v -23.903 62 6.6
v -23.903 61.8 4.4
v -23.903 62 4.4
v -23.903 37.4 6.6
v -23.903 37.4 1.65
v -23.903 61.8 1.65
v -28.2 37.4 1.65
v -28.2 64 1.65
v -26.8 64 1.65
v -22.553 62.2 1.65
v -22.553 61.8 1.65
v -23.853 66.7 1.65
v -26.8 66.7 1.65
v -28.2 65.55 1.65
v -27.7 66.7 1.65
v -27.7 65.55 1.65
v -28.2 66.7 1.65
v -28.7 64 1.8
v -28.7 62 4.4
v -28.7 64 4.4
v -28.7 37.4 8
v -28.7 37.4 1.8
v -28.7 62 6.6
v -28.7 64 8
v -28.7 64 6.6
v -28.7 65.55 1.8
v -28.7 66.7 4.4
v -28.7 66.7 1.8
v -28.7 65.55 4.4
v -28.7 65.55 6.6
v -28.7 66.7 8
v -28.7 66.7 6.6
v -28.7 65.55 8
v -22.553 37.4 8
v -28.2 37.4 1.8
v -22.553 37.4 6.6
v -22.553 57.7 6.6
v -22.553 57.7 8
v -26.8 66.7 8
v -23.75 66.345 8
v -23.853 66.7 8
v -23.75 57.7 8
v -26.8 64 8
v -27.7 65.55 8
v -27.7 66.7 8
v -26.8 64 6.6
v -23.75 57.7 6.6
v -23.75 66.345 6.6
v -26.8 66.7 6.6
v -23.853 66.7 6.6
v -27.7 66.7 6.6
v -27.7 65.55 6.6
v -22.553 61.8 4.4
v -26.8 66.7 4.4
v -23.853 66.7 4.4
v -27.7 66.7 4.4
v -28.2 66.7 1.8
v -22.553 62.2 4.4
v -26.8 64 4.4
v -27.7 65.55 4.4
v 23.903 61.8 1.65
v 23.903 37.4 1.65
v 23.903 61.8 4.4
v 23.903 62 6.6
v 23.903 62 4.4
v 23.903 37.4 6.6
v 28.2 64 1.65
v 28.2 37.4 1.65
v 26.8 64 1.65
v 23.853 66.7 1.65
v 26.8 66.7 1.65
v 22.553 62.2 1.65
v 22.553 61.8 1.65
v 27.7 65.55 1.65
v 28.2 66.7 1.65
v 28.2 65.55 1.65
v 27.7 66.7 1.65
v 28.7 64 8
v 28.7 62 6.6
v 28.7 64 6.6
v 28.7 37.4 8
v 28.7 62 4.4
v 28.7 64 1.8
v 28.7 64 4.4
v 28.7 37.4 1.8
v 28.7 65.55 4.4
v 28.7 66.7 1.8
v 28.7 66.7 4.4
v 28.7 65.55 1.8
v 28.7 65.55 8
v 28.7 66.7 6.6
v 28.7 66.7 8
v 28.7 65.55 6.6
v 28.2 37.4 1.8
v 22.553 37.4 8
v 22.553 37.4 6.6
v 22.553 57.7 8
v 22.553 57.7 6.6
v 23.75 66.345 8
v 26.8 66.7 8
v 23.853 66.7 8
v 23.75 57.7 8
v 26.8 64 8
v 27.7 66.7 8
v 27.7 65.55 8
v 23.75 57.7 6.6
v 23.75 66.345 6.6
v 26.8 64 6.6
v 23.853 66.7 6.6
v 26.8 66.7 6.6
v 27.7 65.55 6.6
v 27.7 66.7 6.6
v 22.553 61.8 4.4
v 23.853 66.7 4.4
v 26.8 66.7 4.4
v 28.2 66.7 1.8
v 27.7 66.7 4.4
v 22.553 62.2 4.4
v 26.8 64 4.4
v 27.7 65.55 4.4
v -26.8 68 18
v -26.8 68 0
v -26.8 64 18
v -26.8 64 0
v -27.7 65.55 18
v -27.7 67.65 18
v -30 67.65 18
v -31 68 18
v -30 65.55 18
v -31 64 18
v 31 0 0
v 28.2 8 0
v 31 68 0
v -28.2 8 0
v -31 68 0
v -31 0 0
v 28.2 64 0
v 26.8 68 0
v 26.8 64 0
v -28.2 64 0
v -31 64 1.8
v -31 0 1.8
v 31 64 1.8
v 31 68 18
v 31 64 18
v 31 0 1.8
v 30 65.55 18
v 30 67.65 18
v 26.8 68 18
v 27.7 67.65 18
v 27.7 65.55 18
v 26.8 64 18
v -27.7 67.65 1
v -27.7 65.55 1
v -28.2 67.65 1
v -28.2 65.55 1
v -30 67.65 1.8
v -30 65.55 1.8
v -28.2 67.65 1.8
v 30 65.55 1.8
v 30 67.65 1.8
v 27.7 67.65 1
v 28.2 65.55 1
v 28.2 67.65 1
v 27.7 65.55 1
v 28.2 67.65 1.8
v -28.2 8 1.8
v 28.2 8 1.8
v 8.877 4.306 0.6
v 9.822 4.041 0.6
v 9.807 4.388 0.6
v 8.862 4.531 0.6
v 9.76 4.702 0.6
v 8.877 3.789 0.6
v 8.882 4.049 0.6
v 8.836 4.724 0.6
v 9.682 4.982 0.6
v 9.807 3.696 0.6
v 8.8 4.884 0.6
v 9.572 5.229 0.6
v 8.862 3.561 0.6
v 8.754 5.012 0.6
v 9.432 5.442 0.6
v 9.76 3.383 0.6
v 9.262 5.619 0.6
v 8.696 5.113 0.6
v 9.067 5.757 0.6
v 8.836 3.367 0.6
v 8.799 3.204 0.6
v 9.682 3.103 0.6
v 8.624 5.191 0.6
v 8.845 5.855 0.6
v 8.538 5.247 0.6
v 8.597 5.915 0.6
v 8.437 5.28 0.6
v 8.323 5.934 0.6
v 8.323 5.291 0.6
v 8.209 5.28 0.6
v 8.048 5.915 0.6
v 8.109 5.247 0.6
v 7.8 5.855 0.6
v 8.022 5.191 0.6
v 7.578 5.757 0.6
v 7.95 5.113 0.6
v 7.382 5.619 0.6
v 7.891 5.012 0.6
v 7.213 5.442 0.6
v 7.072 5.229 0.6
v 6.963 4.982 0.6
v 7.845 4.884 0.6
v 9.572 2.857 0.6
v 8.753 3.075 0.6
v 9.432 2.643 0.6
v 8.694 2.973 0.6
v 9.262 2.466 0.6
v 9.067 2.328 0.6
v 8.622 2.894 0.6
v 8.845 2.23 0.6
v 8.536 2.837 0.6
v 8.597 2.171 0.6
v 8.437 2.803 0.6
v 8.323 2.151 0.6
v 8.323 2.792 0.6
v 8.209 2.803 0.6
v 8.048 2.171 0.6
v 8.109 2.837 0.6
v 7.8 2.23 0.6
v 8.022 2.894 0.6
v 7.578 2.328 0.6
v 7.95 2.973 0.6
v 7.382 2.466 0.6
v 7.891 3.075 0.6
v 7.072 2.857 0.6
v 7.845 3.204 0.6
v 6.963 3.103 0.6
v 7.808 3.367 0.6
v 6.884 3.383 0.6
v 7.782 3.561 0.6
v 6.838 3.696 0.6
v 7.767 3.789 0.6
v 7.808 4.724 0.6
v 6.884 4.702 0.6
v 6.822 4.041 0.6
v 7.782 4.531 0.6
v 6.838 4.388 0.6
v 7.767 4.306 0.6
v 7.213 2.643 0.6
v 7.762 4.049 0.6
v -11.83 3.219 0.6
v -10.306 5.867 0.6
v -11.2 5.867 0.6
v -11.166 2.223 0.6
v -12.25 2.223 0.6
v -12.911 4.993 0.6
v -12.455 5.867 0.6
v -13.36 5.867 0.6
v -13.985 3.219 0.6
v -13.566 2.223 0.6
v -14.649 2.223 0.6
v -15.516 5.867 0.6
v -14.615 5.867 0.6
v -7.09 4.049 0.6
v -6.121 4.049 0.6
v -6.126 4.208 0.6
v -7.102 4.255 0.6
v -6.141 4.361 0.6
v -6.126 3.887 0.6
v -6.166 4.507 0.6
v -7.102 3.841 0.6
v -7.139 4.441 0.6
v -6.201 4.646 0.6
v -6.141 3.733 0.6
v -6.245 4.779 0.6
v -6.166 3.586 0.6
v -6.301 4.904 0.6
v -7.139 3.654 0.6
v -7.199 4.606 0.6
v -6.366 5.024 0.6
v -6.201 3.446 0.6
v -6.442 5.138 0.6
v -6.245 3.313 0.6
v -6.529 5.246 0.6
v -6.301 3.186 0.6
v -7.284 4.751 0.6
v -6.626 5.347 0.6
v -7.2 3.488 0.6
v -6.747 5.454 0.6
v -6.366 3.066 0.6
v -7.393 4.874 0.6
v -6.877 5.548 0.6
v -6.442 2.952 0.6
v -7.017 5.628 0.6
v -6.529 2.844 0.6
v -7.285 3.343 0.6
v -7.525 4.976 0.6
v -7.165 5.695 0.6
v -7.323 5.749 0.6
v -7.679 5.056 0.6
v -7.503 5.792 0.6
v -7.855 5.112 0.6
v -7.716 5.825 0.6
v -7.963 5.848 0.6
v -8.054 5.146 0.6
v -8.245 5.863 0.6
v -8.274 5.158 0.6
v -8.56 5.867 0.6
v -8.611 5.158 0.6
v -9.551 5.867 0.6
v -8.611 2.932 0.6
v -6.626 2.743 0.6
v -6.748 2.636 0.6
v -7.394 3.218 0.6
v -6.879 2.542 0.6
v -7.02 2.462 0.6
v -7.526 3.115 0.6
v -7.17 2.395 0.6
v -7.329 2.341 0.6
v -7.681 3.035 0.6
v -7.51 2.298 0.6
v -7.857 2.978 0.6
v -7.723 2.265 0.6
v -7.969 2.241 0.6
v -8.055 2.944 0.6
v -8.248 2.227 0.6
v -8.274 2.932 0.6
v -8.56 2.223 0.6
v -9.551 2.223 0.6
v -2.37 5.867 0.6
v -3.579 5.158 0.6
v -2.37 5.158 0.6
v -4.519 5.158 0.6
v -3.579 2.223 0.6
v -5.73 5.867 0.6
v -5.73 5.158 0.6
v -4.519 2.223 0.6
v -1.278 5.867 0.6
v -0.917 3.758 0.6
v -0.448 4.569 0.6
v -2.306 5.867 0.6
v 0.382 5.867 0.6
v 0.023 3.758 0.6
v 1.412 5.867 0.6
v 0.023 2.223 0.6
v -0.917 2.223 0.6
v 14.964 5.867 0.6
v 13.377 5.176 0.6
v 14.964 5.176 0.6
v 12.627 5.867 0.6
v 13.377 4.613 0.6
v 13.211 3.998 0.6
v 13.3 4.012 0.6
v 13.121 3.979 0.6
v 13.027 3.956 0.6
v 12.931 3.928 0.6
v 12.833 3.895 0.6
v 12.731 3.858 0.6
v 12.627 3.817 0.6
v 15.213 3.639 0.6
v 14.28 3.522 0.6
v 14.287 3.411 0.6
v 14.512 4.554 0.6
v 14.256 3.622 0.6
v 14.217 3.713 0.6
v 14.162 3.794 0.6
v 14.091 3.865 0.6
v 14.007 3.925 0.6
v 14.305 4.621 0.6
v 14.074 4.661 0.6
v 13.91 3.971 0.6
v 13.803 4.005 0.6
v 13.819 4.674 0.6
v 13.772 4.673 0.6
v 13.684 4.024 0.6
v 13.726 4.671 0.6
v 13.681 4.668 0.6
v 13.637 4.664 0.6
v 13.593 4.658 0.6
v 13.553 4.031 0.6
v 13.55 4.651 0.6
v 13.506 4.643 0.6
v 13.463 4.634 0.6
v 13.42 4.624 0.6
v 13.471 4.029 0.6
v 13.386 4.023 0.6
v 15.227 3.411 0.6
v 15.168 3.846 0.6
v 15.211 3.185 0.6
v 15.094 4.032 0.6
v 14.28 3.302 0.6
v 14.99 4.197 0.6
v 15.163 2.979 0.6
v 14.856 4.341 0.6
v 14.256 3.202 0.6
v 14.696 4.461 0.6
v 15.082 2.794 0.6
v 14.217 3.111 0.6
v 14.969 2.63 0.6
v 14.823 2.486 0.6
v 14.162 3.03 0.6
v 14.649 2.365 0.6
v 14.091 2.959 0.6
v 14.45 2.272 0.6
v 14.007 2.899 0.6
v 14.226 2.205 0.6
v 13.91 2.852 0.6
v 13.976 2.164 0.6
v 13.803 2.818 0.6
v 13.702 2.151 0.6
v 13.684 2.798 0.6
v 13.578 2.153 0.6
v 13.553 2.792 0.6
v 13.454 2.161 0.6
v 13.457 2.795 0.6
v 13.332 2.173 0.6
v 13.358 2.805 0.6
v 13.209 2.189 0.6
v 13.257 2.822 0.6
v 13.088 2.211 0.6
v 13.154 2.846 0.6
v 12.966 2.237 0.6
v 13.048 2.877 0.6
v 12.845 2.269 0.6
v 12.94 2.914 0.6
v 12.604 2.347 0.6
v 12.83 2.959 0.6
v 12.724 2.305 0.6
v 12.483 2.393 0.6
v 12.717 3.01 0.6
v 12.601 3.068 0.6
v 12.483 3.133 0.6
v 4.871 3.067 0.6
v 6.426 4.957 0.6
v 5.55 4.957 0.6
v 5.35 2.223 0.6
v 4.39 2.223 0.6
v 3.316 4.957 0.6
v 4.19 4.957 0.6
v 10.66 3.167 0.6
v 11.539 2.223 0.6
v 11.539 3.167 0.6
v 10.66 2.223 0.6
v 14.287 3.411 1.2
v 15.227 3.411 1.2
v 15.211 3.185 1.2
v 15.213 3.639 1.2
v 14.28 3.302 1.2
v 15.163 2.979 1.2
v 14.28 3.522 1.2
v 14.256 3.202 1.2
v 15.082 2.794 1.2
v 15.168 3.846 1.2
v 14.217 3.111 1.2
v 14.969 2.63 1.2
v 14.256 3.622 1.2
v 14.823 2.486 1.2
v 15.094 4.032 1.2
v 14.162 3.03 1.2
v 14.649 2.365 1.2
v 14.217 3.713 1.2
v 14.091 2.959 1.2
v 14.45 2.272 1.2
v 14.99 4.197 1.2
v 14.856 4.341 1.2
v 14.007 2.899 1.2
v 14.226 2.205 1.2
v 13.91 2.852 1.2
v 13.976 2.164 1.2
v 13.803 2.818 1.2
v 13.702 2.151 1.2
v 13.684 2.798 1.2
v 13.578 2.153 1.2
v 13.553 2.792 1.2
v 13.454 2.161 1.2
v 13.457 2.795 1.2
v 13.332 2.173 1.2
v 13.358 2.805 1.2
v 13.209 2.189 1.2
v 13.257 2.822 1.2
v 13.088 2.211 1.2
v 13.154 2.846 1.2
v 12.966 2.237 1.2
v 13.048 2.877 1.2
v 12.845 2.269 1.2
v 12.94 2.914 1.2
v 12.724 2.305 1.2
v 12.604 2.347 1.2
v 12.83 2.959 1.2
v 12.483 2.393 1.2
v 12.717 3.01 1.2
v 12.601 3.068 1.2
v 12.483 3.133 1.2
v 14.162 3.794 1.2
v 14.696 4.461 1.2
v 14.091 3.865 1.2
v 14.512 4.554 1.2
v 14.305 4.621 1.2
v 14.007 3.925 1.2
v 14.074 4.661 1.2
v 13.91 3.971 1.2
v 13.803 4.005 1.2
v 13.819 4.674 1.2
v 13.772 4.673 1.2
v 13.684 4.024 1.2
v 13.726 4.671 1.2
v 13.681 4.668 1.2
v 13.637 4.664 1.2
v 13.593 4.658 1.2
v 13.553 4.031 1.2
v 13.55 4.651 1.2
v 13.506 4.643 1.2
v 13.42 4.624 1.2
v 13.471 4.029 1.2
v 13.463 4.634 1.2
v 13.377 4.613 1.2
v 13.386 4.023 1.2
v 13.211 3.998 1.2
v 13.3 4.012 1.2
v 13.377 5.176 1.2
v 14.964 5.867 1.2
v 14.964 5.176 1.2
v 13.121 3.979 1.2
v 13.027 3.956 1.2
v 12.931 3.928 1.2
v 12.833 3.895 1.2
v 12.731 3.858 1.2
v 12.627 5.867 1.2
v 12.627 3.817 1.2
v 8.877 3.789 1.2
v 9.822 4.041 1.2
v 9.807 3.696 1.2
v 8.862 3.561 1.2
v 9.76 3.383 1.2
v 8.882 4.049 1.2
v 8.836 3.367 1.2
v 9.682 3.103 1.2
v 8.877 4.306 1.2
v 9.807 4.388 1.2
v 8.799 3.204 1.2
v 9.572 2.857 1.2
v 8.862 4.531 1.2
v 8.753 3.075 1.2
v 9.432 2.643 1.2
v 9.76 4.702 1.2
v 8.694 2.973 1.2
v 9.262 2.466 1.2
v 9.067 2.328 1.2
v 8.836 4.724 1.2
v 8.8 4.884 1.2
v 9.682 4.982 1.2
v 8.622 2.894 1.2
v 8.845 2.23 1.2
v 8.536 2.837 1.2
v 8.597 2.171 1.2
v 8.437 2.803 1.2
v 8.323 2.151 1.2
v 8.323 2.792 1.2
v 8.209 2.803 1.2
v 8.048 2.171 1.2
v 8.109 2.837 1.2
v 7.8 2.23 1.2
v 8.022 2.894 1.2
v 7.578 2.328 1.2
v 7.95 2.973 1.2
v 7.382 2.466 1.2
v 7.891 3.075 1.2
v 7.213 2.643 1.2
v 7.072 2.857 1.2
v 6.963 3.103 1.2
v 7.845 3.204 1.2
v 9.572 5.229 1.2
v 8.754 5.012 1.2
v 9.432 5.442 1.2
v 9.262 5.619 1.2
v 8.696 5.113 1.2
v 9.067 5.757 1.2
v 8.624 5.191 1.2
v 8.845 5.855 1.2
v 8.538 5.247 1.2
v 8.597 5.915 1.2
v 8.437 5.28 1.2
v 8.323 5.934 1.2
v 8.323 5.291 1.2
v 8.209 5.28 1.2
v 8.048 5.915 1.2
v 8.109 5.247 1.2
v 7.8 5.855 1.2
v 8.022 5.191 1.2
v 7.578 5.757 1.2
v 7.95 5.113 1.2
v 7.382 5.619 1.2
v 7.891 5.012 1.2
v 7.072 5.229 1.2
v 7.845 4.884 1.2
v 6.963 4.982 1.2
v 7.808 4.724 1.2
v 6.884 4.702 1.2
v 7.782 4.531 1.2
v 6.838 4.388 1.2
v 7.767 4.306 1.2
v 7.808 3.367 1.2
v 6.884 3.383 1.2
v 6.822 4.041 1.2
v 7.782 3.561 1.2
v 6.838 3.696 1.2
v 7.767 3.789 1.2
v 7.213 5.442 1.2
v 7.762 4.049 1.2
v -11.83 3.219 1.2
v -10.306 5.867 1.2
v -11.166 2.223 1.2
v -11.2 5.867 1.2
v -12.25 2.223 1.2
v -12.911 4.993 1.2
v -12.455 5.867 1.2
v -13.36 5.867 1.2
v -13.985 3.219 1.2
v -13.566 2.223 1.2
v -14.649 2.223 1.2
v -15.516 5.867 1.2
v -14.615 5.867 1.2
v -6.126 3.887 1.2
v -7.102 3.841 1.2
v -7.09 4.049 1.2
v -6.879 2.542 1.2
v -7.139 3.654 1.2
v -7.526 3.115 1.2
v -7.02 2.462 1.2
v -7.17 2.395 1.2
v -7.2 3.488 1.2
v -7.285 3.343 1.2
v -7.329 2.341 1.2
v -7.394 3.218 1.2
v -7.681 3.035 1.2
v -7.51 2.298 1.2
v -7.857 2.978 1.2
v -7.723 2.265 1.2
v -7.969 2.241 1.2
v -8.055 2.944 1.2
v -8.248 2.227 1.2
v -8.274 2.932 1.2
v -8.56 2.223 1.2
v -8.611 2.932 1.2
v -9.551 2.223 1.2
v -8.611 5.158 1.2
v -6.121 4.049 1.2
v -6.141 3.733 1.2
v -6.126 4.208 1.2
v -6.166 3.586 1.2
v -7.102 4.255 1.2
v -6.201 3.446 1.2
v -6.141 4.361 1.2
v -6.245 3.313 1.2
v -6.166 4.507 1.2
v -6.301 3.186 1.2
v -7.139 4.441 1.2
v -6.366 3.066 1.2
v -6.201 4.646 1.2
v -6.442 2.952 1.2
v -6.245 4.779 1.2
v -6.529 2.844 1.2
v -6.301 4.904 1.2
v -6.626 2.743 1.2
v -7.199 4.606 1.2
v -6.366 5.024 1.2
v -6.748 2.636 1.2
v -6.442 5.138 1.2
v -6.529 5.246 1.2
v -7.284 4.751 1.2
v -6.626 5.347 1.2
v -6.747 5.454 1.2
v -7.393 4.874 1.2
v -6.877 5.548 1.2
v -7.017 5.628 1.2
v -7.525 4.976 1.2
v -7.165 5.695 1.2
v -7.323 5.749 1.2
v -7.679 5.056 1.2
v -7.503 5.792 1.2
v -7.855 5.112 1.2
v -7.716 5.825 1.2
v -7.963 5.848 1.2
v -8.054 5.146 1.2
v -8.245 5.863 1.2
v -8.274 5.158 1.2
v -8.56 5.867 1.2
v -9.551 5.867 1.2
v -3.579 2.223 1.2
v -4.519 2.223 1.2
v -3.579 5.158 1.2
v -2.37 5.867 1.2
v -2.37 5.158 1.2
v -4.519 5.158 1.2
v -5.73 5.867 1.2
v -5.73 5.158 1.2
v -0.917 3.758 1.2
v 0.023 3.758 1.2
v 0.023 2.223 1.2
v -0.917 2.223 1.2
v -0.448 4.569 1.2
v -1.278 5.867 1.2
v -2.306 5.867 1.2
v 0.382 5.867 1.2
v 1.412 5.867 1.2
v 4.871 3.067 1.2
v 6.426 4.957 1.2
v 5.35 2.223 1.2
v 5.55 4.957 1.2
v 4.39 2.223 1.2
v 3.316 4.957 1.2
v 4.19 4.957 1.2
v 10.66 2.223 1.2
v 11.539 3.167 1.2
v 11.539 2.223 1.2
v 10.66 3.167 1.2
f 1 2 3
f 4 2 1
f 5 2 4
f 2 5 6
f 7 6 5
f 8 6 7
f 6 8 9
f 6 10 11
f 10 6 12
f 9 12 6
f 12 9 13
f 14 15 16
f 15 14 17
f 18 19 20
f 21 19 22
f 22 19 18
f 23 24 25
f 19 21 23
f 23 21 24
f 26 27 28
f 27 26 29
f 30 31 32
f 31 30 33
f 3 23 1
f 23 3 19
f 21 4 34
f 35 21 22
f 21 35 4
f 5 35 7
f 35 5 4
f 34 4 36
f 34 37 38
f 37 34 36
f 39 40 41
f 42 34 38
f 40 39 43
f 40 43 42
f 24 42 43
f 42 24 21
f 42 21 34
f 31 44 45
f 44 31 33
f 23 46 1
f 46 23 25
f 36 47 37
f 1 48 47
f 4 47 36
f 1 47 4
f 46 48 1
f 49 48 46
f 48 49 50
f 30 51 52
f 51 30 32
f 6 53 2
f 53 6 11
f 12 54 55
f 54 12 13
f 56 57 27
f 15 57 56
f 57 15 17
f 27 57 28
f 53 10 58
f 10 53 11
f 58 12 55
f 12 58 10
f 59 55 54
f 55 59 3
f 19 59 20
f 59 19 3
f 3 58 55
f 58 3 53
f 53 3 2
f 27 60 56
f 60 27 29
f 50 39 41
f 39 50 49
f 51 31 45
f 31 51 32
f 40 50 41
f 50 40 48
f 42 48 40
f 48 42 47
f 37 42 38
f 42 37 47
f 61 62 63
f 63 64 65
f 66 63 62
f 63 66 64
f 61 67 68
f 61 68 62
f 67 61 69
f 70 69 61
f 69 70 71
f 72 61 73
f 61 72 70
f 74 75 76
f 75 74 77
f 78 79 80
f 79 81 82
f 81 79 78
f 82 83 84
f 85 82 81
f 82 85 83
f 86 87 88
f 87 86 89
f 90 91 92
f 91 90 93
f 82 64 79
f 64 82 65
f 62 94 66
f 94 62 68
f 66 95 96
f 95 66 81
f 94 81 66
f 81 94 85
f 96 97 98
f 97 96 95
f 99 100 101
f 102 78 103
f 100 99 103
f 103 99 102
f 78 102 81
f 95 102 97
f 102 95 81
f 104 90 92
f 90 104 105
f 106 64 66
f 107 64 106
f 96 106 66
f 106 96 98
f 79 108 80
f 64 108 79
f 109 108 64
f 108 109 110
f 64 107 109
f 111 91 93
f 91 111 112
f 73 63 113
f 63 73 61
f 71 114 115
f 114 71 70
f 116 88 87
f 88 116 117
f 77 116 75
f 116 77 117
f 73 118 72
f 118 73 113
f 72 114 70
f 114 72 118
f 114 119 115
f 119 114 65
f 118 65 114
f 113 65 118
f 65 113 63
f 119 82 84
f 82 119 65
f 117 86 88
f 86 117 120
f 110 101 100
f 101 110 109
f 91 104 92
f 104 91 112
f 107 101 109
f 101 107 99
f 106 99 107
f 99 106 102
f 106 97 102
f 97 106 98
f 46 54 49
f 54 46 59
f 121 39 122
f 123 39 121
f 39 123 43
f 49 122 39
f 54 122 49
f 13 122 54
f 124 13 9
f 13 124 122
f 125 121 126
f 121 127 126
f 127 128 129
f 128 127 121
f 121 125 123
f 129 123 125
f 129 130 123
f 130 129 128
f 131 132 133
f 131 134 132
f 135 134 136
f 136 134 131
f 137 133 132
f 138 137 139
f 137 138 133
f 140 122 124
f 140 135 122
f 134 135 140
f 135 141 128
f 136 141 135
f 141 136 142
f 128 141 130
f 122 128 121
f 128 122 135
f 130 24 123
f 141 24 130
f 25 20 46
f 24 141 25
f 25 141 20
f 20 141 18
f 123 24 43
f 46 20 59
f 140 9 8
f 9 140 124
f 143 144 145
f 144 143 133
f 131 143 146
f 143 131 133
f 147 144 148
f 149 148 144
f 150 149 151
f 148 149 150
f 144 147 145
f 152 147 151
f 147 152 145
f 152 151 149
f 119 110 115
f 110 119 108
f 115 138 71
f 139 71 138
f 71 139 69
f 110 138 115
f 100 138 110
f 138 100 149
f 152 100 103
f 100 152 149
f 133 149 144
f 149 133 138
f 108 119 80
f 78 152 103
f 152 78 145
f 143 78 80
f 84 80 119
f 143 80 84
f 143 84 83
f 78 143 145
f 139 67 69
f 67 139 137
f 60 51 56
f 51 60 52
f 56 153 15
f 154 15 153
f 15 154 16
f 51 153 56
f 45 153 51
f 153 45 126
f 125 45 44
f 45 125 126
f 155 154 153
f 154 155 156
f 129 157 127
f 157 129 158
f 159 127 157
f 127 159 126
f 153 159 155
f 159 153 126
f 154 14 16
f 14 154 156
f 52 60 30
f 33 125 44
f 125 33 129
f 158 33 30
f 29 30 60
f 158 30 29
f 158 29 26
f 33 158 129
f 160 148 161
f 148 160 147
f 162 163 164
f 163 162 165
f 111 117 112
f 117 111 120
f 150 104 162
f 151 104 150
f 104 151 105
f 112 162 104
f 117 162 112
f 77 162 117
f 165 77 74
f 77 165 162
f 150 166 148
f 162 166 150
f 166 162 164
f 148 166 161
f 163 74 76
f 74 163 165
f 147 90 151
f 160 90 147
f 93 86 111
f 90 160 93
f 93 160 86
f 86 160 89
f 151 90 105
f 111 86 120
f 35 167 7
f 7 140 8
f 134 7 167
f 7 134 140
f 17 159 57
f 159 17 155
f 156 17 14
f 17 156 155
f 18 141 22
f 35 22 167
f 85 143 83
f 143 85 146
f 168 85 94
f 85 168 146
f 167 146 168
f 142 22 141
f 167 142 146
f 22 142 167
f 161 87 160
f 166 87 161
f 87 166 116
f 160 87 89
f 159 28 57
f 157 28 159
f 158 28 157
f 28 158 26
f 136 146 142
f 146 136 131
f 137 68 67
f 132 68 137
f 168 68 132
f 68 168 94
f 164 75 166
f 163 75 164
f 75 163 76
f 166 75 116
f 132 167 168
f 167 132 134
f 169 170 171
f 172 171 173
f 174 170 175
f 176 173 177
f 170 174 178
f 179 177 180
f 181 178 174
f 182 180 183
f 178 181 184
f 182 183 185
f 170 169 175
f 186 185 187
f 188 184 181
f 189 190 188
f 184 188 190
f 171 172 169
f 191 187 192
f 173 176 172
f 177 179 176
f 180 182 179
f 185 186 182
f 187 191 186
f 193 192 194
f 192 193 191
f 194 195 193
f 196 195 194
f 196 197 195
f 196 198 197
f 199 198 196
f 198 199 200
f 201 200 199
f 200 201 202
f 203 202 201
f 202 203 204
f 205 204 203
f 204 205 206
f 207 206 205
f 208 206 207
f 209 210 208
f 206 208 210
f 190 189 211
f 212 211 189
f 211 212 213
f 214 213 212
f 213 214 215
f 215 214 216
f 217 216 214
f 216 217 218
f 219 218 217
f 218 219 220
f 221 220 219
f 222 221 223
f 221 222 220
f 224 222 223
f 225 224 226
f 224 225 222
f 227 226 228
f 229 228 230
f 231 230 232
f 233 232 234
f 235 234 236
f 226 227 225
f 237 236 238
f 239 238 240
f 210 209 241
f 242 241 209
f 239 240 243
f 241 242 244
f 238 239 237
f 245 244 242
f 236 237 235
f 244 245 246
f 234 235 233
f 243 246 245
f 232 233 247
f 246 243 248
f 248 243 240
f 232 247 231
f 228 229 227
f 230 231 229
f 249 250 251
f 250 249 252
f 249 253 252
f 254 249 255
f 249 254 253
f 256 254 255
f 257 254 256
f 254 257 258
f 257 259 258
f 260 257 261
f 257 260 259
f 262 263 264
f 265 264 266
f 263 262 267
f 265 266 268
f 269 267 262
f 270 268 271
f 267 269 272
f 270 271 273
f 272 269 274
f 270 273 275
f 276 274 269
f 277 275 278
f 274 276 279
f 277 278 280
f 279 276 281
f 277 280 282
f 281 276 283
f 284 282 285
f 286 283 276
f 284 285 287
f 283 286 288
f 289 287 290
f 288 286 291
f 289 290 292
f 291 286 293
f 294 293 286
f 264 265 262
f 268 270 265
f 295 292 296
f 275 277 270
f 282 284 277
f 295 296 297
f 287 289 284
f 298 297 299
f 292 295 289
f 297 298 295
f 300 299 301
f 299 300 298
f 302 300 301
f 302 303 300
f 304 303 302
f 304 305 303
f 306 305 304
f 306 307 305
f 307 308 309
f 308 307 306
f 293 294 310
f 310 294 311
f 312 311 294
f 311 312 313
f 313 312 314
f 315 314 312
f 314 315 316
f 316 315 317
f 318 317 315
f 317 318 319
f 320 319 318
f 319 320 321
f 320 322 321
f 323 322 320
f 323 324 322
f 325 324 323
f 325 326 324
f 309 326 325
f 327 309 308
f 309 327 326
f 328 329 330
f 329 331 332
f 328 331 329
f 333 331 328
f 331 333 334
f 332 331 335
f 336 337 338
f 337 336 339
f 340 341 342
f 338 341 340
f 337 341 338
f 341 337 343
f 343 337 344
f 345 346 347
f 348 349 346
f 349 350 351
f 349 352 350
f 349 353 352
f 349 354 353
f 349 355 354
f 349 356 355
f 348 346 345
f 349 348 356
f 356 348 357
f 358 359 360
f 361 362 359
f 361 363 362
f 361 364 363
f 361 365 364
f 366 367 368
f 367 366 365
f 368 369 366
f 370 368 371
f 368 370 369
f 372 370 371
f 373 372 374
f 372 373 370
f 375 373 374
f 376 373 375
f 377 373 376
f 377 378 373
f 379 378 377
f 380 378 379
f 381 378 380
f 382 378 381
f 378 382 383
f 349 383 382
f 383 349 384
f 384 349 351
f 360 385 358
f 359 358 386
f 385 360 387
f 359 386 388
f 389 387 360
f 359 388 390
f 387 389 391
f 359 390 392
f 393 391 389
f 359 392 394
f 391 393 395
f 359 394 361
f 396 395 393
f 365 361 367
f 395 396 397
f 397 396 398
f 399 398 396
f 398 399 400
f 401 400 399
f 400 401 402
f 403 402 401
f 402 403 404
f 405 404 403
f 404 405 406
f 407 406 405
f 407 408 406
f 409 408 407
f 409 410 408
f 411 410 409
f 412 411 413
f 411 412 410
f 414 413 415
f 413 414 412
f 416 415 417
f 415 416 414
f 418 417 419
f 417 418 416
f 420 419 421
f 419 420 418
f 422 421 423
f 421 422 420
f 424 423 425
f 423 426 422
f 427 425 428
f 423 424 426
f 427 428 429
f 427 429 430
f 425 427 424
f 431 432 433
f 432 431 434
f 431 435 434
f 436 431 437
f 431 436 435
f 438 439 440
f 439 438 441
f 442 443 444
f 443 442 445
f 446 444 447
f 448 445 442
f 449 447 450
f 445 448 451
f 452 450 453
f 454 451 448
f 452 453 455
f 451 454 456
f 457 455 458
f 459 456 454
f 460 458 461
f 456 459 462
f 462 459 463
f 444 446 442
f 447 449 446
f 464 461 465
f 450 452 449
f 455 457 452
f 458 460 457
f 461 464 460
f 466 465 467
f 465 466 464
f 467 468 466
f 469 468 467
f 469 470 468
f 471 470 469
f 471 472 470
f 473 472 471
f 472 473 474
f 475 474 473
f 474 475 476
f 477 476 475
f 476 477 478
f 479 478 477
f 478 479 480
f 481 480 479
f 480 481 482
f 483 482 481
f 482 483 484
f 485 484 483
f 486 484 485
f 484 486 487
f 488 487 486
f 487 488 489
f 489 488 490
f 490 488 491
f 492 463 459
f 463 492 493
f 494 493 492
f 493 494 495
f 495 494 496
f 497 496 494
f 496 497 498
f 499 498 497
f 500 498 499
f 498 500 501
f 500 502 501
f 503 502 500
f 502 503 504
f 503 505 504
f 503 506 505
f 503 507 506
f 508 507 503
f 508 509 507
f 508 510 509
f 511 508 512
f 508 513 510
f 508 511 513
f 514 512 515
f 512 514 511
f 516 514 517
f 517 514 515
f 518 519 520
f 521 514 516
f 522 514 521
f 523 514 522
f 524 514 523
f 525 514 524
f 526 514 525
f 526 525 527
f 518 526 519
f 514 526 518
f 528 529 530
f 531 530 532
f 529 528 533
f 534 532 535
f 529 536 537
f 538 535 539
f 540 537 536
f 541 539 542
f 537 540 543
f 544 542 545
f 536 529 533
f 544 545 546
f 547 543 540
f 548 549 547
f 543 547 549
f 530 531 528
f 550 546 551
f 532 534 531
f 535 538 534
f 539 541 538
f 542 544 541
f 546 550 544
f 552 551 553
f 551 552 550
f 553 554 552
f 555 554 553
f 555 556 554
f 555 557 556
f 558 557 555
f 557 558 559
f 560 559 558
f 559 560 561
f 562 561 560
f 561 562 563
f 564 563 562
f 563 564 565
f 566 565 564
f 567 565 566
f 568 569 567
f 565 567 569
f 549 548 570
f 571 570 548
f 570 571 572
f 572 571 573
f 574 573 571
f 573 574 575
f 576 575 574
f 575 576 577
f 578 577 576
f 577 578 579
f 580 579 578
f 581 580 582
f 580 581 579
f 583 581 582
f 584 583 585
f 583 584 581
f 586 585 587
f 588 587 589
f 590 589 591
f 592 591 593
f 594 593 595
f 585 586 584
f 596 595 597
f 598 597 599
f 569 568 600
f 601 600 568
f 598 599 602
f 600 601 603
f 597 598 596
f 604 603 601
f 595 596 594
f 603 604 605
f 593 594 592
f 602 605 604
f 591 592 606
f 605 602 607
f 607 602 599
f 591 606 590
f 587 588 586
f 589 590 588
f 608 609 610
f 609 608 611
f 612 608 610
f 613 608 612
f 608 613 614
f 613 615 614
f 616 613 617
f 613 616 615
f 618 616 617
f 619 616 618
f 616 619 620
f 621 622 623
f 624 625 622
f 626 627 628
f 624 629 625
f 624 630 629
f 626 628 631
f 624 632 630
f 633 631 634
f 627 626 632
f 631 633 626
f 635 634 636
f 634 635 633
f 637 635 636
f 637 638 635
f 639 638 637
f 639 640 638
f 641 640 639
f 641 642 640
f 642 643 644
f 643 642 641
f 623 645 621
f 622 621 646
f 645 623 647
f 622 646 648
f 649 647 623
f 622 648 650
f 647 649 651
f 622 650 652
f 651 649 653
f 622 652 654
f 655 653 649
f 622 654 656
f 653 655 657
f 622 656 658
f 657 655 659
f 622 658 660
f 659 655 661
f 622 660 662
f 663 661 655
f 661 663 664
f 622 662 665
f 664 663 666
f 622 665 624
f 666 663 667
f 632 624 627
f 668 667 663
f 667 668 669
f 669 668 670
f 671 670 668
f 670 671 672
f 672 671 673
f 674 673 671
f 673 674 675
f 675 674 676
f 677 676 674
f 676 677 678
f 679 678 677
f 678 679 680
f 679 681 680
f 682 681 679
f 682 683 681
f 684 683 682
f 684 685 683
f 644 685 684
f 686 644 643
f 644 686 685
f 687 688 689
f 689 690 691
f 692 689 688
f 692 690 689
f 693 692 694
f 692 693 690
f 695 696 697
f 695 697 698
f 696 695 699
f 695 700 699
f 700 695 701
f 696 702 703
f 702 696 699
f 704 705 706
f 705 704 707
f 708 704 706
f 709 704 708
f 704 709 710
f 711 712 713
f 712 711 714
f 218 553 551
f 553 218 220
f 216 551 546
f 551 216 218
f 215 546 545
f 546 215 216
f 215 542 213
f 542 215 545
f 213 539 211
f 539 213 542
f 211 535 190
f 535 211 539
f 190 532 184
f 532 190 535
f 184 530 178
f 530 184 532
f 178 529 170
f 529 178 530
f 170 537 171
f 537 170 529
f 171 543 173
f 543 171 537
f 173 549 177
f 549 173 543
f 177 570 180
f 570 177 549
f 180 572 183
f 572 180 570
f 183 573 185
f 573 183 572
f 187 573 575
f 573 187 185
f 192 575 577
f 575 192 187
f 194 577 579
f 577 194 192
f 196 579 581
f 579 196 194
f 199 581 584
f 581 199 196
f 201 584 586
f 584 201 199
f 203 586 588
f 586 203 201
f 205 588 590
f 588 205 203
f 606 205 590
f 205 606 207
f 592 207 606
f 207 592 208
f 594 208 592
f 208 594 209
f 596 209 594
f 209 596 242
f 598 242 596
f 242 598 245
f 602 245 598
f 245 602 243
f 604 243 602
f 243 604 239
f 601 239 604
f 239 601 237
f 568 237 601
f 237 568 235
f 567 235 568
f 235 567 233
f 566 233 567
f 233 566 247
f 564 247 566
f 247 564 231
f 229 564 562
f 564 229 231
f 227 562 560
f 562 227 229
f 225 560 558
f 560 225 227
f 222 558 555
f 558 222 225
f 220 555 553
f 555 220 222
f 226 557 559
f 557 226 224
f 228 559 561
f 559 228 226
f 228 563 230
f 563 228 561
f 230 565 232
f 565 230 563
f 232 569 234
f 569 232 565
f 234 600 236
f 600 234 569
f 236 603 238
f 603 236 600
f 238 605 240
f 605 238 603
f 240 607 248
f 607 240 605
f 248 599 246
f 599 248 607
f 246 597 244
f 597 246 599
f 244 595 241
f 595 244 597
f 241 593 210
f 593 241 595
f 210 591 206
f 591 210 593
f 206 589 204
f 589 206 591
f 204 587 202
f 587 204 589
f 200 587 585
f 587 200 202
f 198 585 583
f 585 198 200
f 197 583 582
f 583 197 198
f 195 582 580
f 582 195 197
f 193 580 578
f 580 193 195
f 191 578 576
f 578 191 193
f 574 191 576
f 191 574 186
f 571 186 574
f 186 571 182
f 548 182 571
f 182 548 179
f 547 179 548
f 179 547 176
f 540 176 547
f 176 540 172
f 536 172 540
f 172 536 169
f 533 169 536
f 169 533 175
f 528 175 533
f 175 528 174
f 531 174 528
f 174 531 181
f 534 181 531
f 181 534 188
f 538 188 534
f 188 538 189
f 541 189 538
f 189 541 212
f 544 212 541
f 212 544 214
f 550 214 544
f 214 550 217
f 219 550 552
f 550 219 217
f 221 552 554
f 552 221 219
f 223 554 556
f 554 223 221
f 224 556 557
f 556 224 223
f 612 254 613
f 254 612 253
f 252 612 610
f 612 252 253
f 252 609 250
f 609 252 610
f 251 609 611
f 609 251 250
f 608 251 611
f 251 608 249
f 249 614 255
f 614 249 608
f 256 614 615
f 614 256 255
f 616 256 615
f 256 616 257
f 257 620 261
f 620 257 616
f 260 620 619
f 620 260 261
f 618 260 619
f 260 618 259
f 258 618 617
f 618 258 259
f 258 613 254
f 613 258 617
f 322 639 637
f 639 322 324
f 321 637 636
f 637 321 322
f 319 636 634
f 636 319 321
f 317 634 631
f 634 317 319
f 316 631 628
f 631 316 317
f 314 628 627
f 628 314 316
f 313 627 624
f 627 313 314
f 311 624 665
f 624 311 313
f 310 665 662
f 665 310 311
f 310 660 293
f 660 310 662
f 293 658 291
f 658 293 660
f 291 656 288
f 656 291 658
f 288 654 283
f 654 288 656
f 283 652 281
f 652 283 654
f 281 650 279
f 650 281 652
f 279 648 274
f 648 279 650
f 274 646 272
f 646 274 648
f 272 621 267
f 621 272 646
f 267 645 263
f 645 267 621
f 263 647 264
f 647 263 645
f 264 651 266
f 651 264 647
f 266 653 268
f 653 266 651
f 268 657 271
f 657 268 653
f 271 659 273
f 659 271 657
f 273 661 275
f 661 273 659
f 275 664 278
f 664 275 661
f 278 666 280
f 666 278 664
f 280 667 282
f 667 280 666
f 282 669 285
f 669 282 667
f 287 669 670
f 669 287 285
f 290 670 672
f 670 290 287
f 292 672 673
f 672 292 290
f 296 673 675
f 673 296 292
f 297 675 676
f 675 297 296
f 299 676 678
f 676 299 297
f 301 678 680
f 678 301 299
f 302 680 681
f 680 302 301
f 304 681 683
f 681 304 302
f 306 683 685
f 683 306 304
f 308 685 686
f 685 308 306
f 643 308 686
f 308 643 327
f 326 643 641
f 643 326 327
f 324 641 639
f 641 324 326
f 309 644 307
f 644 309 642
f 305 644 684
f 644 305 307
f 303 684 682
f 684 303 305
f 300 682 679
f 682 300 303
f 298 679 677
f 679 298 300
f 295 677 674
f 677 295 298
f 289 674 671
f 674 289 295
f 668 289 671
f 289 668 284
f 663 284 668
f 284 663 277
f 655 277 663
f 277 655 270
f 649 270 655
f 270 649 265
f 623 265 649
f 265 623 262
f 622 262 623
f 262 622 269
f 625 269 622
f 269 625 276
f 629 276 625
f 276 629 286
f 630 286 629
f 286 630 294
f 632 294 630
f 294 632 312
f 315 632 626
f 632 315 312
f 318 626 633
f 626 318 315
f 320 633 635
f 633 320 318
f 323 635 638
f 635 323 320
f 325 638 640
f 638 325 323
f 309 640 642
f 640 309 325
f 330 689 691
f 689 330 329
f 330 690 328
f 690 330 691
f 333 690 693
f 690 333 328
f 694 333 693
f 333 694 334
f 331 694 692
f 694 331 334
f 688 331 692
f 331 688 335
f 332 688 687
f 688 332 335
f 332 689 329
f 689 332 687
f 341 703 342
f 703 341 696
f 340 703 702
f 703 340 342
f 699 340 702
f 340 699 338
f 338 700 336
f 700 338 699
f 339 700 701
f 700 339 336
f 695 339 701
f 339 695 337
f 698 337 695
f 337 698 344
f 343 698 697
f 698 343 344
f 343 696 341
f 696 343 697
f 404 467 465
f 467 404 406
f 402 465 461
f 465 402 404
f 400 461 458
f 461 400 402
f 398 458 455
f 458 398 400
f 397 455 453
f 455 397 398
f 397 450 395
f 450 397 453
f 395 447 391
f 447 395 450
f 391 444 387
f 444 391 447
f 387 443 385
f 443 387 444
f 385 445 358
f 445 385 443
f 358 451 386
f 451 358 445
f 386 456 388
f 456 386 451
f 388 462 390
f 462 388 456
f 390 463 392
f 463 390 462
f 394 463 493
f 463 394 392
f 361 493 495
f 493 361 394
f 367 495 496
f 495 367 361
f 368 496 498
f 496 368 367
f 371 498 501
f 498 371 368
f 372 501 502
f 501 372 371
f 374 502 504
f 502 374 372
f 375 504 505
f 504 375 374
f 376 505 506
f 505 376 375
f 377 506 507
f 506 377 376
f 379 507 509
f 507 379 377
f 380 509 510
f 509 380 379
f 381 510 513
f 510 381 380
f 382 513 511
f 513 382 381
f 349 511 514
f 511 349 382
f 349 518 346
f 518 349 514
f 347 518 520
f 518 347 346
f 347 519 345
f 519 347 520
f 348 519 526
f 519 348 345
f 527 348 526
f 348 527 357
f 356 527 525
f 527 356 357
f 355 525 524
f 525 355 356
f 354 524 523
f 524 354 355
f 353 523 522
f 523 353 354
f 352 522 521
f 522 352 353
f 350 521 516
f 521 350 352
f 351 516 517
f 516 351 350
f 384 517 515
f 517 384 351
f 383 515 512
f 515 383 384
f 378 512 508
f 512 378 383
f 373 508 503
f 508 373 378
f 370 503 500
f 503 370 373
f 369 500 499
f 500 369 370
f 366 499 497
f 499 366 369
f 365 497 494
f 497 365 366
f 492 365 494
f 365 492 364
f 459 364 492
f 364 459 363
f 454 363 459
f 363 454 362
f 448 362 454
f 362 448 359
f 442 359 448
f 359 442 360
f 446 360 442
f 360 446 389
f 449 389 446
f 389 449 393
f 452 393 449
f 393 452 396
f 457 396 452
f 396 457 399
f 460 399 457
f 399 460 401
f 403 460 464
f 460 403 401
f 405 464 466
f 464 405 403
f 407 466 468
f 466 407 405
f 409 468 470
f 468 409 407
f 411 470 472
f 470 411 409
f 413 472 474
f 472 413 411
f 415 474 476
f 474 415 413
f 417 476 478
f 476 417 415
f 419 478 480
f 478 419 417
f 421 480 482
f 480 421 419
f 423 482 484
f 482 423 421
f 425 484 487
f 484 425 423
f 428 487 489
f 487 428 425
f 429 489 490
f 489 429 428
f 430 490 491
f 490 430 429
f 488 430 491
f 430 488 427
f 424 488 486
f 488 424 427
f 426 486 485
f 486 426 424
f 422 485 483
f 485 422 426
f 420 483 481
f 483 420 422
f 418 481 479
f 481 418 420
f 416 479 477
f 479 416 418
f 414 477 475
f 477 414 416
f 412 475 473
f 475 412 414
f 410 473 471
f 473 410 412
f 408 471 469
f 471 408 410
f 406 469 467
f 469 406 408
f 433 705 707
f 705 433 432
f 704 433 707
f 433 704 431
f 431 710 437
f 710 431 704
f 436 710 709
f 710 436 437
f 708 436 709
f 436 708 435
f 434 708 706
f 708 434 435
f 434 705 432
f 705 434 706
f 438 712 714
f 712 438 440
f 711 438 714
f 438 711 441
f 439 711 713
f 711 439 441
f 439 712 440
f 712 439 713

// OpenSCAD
// v0.5 rear-bay fit test for the iodeo ESP Minitel V2 JST board.
// Units: mm. This fixture validates insertion and cable routing before the
// geometry is integrated into another full Minitel body print.

include <pcb_reference.scad>

part = "fixture"; // fixture, coupon, retainer, retainer_assembly, pcb, pcb_bare, components, cable, assembly, position_interference, route_interference
sweep_offset = 0;
$fn = 36;

// Measured hardware and Gerber-derived board dimensions.
pcb_length = 47.10521;
pcb_depth = 36.21792;
pcb_thickness = 1.60;
populated_height = 10.40;

// The USB-C side is the rear/trailing edge. Its metal shell is modelled as
// projecting 4 mm beyond the PCB for routing review, not as a fit datum.
pcb_rear_y = 60.0;
usb_outer_y = 64.0;
loop_front_y = 4.0;
route_depth = usb_outer_y - loop_front_y; // owner-selected 60 mm

pcb_z = 4.70;
slot_vertical_clearance = 0.30;
slot_side_clearance = 0.35;
// One millimetre is enough to carry the 1.6 mm PCB edge while keeping the
// nearby ESP32 module clear on the underside.
edge_capture = 1.00;

// Creality K2 baseline: 0.4 mm nozzle and 0.20 mm layers. Structural walls
// are multiples of practical line widths; the hidden mark spans three layers.
fixture_half_w = 31.0;
fixture_front_y = 0.0;
fixture_rear_y = 68.0;
base_h = 1.80;
rail_front_y = 37.40;
rail_rear_y = 62.00;
rail_mouth_y = 66.50;
rail_top_z = 8.00;
rail_outer_x = 28.70;

// Provisional until the cable is measured. The open fixture remains usable
// with a larger cable; this value controls only the visual routing reference.
cable_d = 5.0;
cable_z = rail_top_z + cable_d/2 + 0.20;

watermark_text = "WDTY v0.5";
watermark_z = 0.60;
watermark_h = 0.60;

board_edge_x = pcb_length/2;
slot_wall_x = board_edge_x + slot_side_clearance;
lip_inner_x = board_edge_x - edge_capture;
slot_bottom_z = pcb_z - slot_vertical_clearance;
slot_top_z = pcb_z + pcb_thickness + slot_vertical_clearance;

module placed_pcb(offset_y=0, thickness=pcb_thickness) {
    // Gerber (x,y) -> fixture (y,x): the USB/JST axis becomes front-to-rear.
    translate([-pcb_length/2, pcb_rear_y-18.11024+offset_y, pcb_z])
        mirror([1,0,0]) rotate([0,0,90])
            linear_extrude(height=thickness) pcb_reference_2d();
}

module left_rail(y0=rail_front_y, y1=rail_rear_y, mouth_y=rail_mouth_y) {
    // C-channel facing the PCB. Only the bare board edge enters the slot.
    difference() {
        union() {
            translate([-rail_outer_x,y0,base_h-0.15]) cube([rail_outer_x-slot_wall_x,y1-y0,slot_bottom_z-base_h+0.15]);
            translate([-rail_outer_x,y0,slot_top_z]) cube([rail_outer_x-lip_inner_x,y1-y0,rail_top_z-slot_top_z]);
            translate([-rail_outer_x,y0,slot_bottom_z]) cube([rail_outer_x-slot_wall_x,y1-y0,slot_top_z-slot_bottom_z]);

            // A flared mouth helps the broad USB-side edge find both slots.
            hull() {
                translate([-rail_outer_x,y1-0.20,base_h-0.15]) cube([rail_outer_x-lip_inner_x,0.40,slot_bottom_z-base_h+0.15]);
                translate([-rail_outer_x,mouth_y-0.20,base_h-0.15]) cube([rail_outer_x-(lip_inner_x+1.30),0.40,slot_bottom_z-base_h+0.15]);
            }
            hull() {
                translate([-rail_outer_x,y1-0.20,slot_top_z]) cube([rail_outer_x-lip_inner_x,0.40,rail_top_z-slot_top_z]);
                translate([-rail_outer_x,mouth_y-0.20,slot_top_z]) cube([rail_outer_x-(lip_inner_x+1.30),0.40,rail_top_z-slot_top_z]);
            }
        }

        // RESET sits very close to this board edge. This window keeps its
        // entire insertion path free while the remaining lip retains the PCB.
        translate([-23.75,57.70,slot_top_z-0.10])
            cube([4.75,mouth_y-57.50,rail_top_z-slot_top_z+0.20]);
    }
}

module right_rail(y0=rail_front_y, y1=rail_rear_y, mouth_y=rail_mouth_y) {
    mirror([1,0,0]) left_rail(y0,y1,mouth_y);
}

module rear_sockets() {
    // Vertical grooves accept the removable retainer after PCB insertion.
    difference() {
        union() {
            translate([-fixture_half_w,64.0,0]) cube([4.2,4.0,18.0]);
            translate([fixture_half_w-4.2,64.0,0]) cube([4.2,4.0,18.0]);
        }
        translate([-fixture_half_w+1.0,65.55,1.0]) cube([2.3,2.10,18.0]);
        translate([fixture_half_w-3.3,65.55,1.0]) cube([2.3,2.10,18.0]);
    }
}

module hidden_watermark(y=4.0) {
    // Enclosed void: 3 x 0.20 mm layers below, in, and above the mark.
    translate([0,y,watermark_z])
        linear_extrude(height=watermark_h)
            text(watermark_text,size=3.6,font="DejaVu Sans:style=Bold",
                 halign="center",valign="center",spacing=1.05);
}

module fixture_v05() {
    difference() {
        union() {
            // Open U-frame: no carrier plate beneath the PCB.
            translate([-fixture_half_w,fixture_front_y,0]) cube([2.80,fixture_rear_y,base_h]);
            translate([fixture_half_w-2.80,fixture_front_y,0]) cube([2.80,fixture_rear_y,base_h]);
            translate([-fixture_half_w,fixture_front_y,0]) cube([2*fixture_half_w,8.00,base_h]);
            left_rail();
            right_rail();
            rear_sockets();
        }
        hidden_watermark();
    }
}

module guide_coupon_v05() {
    // A short, low-filament test of the 47.105 mm board width and 2.20 mm slot.
    translate([0,-37.4,0]) difference() {
        union() {
            left_rail(37.4,49.4,53.9);
            right_rail(37.4,49.4,53.9);
            translate([-28.7,37.4,0]) cube([57.4,6.0,base_h]);
        }
        hidden_watermark(40.4);
    }
}

module retainer_v05() {
    // Slides down into the rear grooves. The centre stays open for USB-C,
    // RESET and laying in the attached cable/DIN lead.
    union() {
        translate([-29.75,65.70,1.0]) cube([1.80,1.80,16.0]);
        translate([27.95,65.70,1.0]) cube([1.80,1.80,16.0]);
        translate([-29.75,65.70,14.0]) cube([59.50,1.80,3.0]);

        // One stop finger bears on a connector-free end of the PCB rear edge.
        translate([16.5,60.20,slot_bottom_z])
            cube([3.0,6.40,slot_top_z-slot_bottom_z]);
        translate([16.5,65.70,slot_bottom_z])
            cube([3.0,1.80,14.0-slot_bottom_z+0.10]);
    }
}

module printable_retainer_v05() {
    // Rotate the rear face onto the build plate. The stop becomes an upright
    // printable rib and needs no generated support.
    translate([0,-1.0,67.50]) rotate([-90,0,0]) retainer_v05();
}

module component_envelopes(offset_y=0) {
    // Conservative photo-derived visual envelopes. They deliberately do not
    // claim exact component placement; only the measured 10.4 mm total height
    // and obvious USB/JST/ESP32 sides are represented.
    // ESP32 module below the board.
    translate([-22.0,43.0+offset_y,1.00]) cube([20.0,14.0,pcb_z-1.00]);
    // USB-C shell at the rear.
    translate([-15.5,pcb_rear_y-2.0+offset_y,pcb_z+pcb_thickness])
        cube([8.5,usb_outer_y-pcb_rear_y+2.0,3.2]);
    // RESET switch beside USB-C.
    translate([-22.7,pcb_rear_y-1.7+offset_y,pcb_z+pcb_thickness]) cube([3.6,3.2,2.3]);
    // JST connector and inserted plug at the front of the populated board.
    translate([-2.0,18.8+offset_y,pcb_z+pcb_thickness]) cube([11.0,8.0,5.10]);
}

module cable_node(p) { translate([p[0],p[1],cable_z]) sphere(d=cable_d); }
module cable_segment(a,b) { hull() { cable_node(a); cable_node(b); } }
module cable_reference() {
    // Cable is already attached before insertion. It leaves the JST toward
    // the front, makes the requested relaxed bend and returns above the right
    // guide rail to the open rear face.
    pts = [[3.5,19.0],[3.5,9.0],[8.0,4.0],[18.0,4.0],[24.0,10.0],[24.0,68.0]];
    for(i=[0:len(pts)-2]) cable_segment(pts[i],pts[i+1]);
}

module assembly_v05() {
    color("#d8c7a7") fixture_v05();
    color("#cf7b35") retainer_v05();
    color("#10201b") placed_pcb();
    color("#a9aaa6") component_envelopes();
    color("#222222") cable_reference();
}

if(part=="fixture") fixture_v05();
else if(part=="coupon") guide_coupon_v05();
else if(part=="retainer") printable_retainer_v05();
else if(part=="retainer_assembly") retainer_v05();
else if(part=="pcb") { placed_pcb(); component_envelopes(); }
else if(part=="pcb_bare") placed_pcb();
else if(part=="components") component_envelopes();
else if(part=="cable") cable_reference();
else if(part=="assembly") assembly_v05();
else if(part=="position_interference") intersection() {
    fixture_v05();
    union() {
        placed_pcb(sweep_offset);
        component_envelopes(sweep_offset);
    }
}
else if(part=="board_position_interference") intersection() {
    fixture_v05();
    placed_pcb(sweep_offset);
}
else if(part=="component_position_interference") intersection() {
    fixture_v05();
    component_envelopes(sweep_offset);
}
else if(part=="route_interference") intersection() {
    fixture_v05();
    union() { component_envelopes(); cable_reference(); }
}
else if(part=="retainer_interference") intersection() {
    retainer_v05();
    union() { placed_pcb(); component_envelopes(); cable_reference(); }
}
